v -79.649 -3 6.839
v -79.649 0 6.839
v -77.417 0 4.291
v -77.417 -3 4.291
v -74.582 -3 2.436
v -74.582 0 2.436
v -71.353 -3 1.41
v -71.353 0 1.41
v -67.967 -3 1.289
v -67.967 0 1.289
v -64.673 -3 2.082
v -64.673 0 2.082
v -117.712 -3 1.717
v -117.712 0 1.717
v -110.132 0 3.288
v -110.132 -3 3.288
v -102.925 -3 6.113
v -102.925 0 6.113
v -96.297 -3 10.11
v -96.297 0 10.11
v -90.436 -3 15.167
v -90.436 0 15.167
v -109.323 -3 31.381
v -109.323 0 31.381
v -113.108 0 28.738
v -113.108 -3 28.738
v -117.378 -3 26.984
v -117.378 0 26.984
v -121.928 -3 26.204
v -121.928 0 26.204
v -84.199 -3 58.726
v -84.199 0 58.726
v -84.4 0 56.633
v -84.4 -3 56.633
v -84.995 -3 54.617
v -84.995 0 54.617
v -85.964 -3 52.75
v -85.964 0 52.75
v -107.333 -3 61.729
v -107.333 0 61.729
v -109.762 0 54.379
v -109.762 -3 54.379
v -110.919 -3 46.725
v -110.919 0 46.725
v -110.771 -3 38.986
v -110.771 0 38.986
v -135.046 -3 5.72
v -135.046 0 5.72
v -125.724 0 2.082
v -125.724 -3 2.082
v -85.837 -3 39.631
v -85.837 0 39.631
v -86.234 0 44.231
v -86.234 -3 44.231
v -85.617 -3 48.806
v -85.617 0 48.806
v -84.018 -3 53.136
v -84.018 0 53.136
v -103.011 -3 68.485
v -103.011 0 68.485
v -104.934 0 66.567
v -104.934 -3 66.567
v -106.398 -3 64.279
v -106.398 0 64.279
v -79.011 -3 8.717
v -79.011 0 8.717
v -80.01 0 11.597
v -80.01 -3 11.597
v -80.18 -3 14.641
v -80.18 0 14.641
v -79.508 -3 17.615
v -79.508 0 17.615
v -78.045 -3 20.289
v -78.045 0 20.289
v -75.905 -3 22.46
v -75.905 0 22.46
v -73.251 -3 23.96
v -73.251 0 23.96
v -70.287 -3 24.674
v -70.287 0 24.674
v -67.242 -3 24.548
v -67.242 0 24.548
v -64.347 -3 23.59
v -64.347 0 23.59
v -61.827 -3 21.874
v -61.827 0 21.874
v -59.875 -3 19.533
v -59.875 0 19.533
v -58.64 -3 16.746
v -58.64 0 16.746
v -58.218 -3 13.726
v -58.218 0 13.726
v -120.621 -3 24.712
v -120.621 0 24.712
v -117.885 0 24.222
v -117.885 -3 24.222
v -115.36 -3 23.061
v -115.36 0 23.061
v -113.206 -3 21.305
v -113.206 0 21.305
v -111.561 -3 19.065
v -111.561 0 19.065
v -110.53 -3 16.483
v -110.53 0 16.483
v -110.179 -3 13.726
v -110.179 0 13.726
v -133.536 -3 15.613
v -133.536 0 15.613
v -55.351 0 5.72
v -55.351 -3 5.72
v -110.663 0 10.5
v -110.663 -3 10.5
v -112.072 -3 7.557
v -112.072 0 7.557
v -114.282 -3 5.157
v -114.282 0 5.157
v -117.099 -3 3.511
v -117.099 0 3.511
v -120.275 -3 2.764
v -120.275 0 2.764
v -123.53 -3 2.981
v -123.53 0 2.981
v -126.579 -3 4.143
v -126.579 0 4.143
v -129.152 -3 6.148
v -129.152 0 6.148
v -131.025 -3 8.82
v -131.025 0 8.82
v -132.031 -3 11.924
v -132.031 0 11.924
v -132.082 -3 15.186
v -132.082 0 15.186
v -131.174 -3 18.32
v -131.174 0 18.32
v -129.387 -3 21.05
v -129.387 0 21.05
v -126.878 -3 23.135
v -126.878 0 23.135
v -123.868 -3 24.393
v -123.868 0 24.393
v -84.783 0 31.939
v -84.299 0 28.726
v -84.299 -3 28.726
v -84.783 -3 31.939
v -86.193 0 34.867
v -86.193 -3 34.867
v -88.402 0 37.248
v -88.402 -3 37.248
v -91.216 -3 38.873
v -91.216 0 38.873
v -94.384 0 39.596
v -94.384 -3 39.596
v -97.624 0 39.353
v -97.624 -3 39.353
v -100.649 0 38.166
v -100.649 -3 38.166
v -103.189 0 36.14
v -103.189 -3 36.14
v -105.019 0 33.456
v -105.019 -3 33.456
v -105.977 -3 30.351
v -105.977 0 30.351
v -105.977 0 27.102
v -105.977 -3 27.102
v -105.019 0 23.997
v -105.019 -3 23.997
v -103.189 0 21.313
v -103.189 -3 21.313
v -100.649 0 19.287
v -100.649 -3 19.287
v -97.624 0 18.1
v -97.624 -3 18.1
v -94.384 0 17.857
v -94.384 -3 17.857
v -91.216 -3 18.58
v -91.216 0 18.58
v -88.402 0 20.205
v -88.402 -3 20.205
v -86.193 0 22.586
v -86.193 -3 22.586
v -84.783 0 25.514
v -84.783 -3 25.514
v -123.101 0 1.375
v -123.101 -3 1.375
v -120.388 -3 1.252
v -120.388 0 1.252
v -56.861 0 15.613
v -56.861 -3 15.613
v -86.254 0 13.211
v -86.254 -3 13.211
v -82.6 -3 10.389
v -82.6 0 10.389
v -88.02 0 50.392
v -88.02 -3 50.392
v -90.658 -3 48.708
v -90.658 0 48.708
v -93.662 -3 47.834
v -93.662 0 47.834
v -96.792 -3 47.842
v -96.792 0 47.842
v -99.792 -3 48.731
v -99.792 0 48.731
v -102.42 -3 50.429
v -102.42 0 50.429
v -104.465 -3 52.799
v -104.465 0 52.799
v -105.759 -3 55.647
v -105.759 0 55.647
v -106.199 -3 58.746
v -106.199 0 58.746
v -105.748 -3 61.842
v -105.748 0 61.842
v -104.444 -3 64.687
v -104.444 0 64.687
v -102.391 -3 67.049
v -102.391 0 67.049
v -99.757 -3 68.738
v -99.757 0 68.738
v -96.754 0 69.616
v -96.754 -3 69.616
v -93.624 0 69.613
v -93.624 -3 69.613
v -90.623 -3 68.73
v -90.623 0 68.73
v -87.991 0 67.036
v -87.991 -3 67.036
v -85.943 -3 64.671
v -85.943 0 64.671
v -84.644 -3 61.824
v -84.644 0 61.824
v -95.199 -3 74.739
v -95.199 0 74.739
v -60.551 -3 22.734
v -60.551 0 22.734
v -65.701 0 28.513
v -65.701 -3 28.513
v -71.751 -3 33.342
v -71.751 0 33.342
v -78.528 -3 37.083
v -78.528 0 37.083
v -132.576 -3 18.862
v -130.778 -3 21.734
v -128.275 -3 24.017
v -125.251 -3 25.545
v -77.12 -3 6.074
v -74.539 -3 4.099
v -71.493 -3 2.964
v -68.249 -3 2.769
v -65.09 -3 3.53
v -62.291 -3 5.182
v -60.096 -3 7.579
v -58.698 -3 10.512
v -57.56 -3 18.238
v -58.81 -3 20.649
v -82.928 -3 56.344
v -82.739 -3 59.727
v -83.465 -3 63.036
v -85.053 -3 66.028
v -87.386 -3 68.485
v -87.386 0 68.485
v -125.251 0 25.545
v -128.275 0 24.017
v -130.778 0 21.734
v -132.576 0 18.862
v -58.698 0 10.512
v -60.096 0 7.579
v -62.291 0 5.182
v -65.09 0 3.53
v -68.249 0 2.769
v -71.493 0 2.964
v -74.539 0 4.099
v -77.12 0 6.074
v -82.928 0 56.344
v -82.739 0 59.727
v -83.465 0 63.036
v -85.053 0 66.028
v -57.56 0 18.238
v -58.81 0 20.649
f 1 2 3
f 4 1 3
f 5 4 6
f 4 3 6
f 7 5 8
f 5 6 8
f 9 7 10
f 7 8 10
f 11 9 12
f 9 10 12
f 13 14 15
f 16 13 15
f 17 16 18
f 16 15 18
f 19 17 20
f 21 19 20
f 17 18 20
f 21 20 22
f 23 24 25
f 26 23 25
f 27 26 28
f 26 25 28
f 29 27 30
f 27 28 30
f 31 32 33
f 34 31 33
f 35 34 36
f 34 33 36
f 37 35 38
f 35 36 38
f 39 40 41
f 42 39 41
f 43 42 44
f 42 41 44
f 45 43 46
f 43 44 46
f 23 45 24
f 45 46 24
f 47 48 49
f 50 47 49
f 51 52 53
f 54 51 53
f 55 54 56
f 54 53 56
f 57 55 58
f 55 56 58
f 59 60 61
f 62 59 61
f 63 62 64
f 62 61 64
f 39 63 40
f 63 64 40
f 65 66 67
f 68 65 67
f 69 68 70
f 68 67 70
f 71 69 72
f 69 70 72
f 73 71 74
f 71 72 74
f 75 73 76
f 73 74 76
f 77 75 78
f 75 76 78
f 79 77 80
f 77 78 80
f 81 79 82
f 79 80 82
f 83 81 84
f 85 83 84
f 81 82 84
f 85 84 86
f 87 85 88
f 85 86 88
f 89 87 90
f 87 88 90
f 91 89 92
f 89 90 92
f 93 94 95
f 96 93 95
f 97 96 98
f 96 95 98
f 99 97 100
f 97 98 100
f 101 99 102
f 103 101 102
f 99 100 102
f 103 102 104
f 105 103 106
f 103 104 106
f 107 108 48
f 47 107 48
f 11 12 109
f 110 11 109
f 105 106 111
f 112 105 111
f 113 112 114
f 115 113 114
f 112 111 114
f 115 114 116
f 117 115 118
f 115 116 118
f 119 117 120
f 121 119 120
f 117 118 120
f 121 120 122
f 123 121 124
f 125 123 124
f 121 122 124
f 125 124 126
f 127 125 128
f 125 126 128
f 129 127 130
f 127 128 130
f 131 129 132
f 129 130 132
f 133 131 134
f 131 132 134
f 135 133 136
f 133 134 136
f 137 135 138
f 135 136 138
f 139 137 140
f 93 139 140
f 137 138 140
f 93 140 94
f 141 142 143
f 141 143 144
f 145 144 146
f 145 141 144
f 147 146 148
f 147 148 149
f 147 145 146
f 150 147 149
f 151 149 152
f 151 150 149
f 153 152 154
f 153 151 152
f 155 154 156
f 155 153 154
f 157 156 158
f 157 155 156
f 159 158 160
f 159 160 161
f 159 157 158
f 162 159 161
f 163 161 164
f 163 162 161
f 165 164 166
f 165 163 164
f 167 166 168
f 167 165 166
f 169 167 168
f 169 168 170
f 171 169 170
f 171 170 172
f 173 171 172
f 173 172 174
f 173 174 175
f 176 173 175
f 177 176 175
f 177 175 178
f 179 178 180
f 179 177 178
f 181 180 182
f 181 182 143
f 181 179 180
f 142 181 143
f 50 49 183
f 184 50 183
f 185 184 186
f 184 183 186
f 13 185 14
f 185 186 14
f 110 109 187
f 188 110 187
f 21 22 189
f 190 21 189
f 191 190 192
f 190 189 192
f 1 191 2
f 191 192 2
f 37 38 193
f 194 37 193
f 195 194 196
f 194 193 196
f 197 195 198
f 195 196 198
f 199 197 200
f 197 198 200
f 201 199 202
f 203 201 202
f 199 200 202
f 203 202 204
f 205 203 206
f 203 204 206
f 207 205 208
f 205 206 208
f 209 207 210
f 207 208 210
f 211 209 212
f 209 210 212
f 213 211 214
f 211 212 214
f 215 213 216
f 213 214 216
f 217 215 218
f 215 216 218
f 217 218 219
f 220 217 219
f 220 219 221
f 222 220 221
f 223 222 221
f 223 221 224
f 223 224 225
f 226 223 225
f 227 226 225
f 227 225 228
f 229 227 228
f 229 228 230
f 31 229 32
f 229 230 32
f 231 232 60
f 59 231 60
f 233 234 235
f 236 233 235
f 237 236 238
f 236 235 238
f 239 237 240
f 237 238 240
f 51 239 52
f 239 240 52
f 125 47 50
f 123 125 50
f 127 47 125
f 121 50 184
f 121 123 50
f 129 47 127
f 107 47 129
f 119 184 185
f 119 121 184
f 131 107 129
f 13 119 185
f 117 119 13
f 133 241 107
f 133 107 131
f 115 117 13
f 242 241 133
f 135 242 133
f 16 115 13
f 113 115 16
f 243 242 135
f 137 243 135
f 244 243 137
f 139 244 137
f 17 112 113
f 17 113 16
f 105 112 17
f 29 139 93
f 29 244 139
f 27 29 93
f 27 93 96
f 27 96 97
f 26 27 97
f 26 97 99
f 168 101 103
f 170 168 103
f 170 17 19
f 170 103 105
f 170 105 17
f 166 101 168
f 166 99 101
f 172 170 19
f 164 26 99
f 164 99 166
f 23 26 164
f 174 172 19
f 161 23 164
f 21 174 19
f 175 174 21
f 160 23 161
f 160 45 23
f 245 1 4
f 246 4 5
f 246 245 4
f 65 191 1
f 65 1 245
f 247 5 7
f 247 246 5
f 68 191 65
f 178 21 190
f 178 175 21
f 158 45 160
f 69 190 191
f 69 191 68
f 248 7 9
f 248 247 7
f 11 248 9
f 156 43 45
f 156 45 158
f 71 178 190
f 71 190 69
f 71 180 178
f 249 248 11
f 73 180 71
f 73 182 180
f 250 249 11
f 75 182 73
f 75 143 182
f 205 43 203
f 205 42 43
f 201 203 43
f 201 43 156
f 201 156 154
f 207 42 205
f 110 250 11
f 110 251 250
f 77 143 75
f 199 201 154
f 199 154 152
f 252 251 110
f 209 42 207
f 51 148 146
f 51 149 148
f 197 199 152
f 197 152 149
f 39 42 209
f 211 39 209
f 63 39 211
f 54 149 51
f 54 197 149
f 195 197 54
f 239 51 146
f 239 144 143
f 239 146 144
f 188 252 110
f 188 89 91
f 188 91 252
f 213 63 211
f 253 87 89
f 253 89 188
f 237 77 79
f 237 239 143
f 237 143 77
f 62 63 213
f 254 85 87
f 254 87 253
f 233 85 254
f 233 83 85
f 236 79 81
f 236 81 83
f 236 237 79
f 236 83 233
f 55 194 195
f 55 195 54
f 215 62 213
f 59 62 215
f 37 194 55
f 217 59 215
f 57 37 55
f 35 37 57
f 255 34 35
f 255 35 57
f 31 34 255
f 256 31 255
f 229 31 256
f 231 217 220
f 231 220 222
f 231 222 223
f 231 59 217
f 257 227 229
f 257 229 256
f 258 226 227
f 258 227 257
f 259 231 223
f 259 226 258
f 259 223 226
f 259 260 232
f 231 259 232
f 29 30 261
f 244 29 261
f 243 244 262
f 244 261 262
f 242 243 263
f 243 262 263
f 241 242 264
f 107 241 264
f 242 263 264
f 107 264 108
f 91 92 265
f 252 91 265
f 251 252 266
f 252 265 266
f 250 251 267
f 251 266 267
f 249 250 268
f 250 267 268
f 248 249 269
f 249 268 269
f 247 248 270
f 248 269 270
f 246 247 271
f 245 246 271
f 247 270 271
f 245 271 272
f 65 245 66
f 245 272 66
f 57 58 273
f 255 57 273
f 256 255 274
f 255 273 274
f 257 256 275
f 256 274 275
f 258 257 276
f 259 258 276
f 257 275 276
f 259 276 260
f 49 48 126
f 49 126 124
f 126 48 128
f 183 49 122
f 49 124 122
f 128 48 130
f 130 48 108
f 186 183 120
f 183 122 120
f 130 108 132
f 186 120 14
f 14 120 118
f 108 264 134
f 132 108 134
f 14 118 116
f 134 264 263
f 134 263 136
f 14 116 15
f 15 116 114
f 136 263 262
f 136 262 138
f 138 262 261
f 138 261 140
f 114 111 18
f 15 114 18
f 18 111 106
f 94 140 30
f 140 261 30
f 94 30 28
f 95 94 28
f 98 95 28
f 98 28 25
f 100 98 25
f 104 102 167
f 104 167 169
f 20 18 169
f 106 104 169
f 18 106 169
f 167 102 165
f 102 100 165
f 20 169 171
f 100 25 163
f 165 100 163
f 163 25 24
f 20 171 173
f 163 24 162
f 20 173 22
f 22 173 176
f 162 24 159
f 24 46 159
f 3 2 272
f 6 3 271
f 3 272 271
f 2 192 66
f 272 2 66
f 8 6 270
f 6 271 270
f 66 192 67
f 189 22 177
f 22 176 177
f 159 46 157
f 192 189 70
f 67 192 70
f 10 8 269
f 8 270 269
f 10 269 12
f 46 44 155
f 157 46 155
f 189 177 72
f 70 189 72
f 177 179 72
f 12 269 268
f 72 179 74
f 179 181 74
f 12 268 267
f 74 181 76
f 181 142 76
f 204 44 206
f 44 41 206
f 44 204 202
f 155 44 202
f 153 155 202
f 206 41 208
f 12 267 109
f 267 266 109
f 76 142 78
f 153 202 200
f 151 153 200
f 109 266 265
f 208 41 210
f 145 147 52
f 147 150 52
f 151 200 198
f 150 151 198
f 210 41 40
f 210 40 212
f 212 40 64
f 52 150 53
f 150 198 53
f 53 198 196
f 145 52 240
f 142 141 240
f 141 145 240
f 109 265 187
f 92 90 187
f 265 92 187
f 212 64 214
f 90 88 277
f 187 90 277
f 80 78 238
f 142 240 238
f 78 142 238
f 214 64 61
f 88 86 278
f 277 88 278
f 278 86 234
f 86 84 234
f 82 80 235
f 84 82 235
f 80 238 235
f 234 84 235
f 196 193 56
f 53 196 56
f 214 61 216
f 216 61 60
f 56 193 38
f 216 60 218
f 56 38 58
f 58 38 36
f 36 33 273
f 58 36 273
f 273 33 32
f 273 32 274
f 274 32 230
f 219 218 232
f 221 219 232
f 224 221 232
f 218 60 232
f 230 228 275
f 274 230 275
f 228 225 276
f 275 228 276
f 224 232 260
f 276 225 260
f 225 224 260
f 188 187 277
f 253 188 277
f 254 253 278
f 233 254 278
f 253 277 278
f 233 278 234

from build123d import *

# Parameters (mm, degrees)
F0_R     = 10.9
F1_DEPTH = 3


with BuildPart() as f1:
    # F0 (on Front) → F1 (new body)
    with BuildSketch(Plane.XZ):
        with BuildLine():
            ThreePointArc((-103.010684, 68.484581), (-105.728194, 65.462684), (-107.332646, 61.728723))
            ThreePointArc((-107.332646, 61.728723), (-110.919129, 46.724993), (-109.322923, 31.381365))
            ThreePointArc((-109.322923, 31.381365), (-115.194842, 27.743972), (-121.92824, 26.204033))
            ThreePointArc((-121.92824, 26.204033), (-129.60444, 22.960502), (-133.536128, 15.612961))
            Line((-133.536128, 15.612961), (-135.046402, 5.720314))
            Line((-135.046402, 5.720314), (-125.723981, 2.081926))
            ThreePointArc((-125.723981, 2.081926), (-121.748186, 1.239441), (-117.712255, 1.716926))
            ThreePointArc((-117.712255, 1.716926), (-102.925402, 6.112806), (-90.435534, 15.166975))
            ThreePointArc((-90.435534, 15.166975), (-84.349499, 11.90044), (-79.649174, 6.839116))
            ThreePointArc((-79.649174, 6.839116), (-73.002094, 1.813097), (-64.673093, 2.081926))
            Line((-64.673093, 2.081926), (-55.350671, 5.720314))
            Line((-55.350671, 5.720314), (-56.860946, 15.612961))
            ThreePointArc((-56.860946, 15.612961), (-58.119231, 19.477343), (-60.55071, 22.733819))
            ThreePointArc((-60.55071, 22.733819), (-71.75108, 33.341669), (-85.837154, 39.631129))
            ThreePointArc((-85.837154, 39.631129), (-86.05127, 46.535056), (-84.018197, 53.13632))
            ThreePointArc((-84.018197, 53.13632), (-82.989076, 61.405869), (-87.38639, 68.484581))
            Line((-87.38639, 68.484581), (-95.198537, 74.738841))
            Line((-95.198537, 74.738841), (-103.010684, 68.484581))
        make_face()
        with BuildLine():
            ThreePointArc((-120.621098, 24.712317), (-113.206213, 21.304741), (-110.179299, 13.726489))
            ThreePointArc((-110.179299, 13.726489), (-129.152385, 6.148238), (-120.621098, 24.712317))
        make_face(mode=Mode.SUBTRACT)
        with Locations((-95.198537, 28.726489)):
            Circle(F0_R, mode=Mode.SUBTRACT)
        with BuildLine():
            ThreePointArc((-79.010881, 8.716992), (-71.79419, 24.42051), (-58.217775, 13.726489))
            ThreePointArc((-58.217775, 13.726489), (-66.64136, 3.032468), (-79.010881, 8.716992))
        make_face(mode=Mode.SUBTRACT)
        with BuildLine():
            ThreePointArc((-85.963632, 52.750159), (-105.748038, 61.842259), (-84.198537, 58.726489))
            ThreePointArc((-84.198537, 58.726489), (-84.649035, 55.61072), (-85.963632, 52.750159))
        make_face(mode=Mode.SUBTRACT)
    extrude(amount=F1_DEPTH)


solid = f1.part
